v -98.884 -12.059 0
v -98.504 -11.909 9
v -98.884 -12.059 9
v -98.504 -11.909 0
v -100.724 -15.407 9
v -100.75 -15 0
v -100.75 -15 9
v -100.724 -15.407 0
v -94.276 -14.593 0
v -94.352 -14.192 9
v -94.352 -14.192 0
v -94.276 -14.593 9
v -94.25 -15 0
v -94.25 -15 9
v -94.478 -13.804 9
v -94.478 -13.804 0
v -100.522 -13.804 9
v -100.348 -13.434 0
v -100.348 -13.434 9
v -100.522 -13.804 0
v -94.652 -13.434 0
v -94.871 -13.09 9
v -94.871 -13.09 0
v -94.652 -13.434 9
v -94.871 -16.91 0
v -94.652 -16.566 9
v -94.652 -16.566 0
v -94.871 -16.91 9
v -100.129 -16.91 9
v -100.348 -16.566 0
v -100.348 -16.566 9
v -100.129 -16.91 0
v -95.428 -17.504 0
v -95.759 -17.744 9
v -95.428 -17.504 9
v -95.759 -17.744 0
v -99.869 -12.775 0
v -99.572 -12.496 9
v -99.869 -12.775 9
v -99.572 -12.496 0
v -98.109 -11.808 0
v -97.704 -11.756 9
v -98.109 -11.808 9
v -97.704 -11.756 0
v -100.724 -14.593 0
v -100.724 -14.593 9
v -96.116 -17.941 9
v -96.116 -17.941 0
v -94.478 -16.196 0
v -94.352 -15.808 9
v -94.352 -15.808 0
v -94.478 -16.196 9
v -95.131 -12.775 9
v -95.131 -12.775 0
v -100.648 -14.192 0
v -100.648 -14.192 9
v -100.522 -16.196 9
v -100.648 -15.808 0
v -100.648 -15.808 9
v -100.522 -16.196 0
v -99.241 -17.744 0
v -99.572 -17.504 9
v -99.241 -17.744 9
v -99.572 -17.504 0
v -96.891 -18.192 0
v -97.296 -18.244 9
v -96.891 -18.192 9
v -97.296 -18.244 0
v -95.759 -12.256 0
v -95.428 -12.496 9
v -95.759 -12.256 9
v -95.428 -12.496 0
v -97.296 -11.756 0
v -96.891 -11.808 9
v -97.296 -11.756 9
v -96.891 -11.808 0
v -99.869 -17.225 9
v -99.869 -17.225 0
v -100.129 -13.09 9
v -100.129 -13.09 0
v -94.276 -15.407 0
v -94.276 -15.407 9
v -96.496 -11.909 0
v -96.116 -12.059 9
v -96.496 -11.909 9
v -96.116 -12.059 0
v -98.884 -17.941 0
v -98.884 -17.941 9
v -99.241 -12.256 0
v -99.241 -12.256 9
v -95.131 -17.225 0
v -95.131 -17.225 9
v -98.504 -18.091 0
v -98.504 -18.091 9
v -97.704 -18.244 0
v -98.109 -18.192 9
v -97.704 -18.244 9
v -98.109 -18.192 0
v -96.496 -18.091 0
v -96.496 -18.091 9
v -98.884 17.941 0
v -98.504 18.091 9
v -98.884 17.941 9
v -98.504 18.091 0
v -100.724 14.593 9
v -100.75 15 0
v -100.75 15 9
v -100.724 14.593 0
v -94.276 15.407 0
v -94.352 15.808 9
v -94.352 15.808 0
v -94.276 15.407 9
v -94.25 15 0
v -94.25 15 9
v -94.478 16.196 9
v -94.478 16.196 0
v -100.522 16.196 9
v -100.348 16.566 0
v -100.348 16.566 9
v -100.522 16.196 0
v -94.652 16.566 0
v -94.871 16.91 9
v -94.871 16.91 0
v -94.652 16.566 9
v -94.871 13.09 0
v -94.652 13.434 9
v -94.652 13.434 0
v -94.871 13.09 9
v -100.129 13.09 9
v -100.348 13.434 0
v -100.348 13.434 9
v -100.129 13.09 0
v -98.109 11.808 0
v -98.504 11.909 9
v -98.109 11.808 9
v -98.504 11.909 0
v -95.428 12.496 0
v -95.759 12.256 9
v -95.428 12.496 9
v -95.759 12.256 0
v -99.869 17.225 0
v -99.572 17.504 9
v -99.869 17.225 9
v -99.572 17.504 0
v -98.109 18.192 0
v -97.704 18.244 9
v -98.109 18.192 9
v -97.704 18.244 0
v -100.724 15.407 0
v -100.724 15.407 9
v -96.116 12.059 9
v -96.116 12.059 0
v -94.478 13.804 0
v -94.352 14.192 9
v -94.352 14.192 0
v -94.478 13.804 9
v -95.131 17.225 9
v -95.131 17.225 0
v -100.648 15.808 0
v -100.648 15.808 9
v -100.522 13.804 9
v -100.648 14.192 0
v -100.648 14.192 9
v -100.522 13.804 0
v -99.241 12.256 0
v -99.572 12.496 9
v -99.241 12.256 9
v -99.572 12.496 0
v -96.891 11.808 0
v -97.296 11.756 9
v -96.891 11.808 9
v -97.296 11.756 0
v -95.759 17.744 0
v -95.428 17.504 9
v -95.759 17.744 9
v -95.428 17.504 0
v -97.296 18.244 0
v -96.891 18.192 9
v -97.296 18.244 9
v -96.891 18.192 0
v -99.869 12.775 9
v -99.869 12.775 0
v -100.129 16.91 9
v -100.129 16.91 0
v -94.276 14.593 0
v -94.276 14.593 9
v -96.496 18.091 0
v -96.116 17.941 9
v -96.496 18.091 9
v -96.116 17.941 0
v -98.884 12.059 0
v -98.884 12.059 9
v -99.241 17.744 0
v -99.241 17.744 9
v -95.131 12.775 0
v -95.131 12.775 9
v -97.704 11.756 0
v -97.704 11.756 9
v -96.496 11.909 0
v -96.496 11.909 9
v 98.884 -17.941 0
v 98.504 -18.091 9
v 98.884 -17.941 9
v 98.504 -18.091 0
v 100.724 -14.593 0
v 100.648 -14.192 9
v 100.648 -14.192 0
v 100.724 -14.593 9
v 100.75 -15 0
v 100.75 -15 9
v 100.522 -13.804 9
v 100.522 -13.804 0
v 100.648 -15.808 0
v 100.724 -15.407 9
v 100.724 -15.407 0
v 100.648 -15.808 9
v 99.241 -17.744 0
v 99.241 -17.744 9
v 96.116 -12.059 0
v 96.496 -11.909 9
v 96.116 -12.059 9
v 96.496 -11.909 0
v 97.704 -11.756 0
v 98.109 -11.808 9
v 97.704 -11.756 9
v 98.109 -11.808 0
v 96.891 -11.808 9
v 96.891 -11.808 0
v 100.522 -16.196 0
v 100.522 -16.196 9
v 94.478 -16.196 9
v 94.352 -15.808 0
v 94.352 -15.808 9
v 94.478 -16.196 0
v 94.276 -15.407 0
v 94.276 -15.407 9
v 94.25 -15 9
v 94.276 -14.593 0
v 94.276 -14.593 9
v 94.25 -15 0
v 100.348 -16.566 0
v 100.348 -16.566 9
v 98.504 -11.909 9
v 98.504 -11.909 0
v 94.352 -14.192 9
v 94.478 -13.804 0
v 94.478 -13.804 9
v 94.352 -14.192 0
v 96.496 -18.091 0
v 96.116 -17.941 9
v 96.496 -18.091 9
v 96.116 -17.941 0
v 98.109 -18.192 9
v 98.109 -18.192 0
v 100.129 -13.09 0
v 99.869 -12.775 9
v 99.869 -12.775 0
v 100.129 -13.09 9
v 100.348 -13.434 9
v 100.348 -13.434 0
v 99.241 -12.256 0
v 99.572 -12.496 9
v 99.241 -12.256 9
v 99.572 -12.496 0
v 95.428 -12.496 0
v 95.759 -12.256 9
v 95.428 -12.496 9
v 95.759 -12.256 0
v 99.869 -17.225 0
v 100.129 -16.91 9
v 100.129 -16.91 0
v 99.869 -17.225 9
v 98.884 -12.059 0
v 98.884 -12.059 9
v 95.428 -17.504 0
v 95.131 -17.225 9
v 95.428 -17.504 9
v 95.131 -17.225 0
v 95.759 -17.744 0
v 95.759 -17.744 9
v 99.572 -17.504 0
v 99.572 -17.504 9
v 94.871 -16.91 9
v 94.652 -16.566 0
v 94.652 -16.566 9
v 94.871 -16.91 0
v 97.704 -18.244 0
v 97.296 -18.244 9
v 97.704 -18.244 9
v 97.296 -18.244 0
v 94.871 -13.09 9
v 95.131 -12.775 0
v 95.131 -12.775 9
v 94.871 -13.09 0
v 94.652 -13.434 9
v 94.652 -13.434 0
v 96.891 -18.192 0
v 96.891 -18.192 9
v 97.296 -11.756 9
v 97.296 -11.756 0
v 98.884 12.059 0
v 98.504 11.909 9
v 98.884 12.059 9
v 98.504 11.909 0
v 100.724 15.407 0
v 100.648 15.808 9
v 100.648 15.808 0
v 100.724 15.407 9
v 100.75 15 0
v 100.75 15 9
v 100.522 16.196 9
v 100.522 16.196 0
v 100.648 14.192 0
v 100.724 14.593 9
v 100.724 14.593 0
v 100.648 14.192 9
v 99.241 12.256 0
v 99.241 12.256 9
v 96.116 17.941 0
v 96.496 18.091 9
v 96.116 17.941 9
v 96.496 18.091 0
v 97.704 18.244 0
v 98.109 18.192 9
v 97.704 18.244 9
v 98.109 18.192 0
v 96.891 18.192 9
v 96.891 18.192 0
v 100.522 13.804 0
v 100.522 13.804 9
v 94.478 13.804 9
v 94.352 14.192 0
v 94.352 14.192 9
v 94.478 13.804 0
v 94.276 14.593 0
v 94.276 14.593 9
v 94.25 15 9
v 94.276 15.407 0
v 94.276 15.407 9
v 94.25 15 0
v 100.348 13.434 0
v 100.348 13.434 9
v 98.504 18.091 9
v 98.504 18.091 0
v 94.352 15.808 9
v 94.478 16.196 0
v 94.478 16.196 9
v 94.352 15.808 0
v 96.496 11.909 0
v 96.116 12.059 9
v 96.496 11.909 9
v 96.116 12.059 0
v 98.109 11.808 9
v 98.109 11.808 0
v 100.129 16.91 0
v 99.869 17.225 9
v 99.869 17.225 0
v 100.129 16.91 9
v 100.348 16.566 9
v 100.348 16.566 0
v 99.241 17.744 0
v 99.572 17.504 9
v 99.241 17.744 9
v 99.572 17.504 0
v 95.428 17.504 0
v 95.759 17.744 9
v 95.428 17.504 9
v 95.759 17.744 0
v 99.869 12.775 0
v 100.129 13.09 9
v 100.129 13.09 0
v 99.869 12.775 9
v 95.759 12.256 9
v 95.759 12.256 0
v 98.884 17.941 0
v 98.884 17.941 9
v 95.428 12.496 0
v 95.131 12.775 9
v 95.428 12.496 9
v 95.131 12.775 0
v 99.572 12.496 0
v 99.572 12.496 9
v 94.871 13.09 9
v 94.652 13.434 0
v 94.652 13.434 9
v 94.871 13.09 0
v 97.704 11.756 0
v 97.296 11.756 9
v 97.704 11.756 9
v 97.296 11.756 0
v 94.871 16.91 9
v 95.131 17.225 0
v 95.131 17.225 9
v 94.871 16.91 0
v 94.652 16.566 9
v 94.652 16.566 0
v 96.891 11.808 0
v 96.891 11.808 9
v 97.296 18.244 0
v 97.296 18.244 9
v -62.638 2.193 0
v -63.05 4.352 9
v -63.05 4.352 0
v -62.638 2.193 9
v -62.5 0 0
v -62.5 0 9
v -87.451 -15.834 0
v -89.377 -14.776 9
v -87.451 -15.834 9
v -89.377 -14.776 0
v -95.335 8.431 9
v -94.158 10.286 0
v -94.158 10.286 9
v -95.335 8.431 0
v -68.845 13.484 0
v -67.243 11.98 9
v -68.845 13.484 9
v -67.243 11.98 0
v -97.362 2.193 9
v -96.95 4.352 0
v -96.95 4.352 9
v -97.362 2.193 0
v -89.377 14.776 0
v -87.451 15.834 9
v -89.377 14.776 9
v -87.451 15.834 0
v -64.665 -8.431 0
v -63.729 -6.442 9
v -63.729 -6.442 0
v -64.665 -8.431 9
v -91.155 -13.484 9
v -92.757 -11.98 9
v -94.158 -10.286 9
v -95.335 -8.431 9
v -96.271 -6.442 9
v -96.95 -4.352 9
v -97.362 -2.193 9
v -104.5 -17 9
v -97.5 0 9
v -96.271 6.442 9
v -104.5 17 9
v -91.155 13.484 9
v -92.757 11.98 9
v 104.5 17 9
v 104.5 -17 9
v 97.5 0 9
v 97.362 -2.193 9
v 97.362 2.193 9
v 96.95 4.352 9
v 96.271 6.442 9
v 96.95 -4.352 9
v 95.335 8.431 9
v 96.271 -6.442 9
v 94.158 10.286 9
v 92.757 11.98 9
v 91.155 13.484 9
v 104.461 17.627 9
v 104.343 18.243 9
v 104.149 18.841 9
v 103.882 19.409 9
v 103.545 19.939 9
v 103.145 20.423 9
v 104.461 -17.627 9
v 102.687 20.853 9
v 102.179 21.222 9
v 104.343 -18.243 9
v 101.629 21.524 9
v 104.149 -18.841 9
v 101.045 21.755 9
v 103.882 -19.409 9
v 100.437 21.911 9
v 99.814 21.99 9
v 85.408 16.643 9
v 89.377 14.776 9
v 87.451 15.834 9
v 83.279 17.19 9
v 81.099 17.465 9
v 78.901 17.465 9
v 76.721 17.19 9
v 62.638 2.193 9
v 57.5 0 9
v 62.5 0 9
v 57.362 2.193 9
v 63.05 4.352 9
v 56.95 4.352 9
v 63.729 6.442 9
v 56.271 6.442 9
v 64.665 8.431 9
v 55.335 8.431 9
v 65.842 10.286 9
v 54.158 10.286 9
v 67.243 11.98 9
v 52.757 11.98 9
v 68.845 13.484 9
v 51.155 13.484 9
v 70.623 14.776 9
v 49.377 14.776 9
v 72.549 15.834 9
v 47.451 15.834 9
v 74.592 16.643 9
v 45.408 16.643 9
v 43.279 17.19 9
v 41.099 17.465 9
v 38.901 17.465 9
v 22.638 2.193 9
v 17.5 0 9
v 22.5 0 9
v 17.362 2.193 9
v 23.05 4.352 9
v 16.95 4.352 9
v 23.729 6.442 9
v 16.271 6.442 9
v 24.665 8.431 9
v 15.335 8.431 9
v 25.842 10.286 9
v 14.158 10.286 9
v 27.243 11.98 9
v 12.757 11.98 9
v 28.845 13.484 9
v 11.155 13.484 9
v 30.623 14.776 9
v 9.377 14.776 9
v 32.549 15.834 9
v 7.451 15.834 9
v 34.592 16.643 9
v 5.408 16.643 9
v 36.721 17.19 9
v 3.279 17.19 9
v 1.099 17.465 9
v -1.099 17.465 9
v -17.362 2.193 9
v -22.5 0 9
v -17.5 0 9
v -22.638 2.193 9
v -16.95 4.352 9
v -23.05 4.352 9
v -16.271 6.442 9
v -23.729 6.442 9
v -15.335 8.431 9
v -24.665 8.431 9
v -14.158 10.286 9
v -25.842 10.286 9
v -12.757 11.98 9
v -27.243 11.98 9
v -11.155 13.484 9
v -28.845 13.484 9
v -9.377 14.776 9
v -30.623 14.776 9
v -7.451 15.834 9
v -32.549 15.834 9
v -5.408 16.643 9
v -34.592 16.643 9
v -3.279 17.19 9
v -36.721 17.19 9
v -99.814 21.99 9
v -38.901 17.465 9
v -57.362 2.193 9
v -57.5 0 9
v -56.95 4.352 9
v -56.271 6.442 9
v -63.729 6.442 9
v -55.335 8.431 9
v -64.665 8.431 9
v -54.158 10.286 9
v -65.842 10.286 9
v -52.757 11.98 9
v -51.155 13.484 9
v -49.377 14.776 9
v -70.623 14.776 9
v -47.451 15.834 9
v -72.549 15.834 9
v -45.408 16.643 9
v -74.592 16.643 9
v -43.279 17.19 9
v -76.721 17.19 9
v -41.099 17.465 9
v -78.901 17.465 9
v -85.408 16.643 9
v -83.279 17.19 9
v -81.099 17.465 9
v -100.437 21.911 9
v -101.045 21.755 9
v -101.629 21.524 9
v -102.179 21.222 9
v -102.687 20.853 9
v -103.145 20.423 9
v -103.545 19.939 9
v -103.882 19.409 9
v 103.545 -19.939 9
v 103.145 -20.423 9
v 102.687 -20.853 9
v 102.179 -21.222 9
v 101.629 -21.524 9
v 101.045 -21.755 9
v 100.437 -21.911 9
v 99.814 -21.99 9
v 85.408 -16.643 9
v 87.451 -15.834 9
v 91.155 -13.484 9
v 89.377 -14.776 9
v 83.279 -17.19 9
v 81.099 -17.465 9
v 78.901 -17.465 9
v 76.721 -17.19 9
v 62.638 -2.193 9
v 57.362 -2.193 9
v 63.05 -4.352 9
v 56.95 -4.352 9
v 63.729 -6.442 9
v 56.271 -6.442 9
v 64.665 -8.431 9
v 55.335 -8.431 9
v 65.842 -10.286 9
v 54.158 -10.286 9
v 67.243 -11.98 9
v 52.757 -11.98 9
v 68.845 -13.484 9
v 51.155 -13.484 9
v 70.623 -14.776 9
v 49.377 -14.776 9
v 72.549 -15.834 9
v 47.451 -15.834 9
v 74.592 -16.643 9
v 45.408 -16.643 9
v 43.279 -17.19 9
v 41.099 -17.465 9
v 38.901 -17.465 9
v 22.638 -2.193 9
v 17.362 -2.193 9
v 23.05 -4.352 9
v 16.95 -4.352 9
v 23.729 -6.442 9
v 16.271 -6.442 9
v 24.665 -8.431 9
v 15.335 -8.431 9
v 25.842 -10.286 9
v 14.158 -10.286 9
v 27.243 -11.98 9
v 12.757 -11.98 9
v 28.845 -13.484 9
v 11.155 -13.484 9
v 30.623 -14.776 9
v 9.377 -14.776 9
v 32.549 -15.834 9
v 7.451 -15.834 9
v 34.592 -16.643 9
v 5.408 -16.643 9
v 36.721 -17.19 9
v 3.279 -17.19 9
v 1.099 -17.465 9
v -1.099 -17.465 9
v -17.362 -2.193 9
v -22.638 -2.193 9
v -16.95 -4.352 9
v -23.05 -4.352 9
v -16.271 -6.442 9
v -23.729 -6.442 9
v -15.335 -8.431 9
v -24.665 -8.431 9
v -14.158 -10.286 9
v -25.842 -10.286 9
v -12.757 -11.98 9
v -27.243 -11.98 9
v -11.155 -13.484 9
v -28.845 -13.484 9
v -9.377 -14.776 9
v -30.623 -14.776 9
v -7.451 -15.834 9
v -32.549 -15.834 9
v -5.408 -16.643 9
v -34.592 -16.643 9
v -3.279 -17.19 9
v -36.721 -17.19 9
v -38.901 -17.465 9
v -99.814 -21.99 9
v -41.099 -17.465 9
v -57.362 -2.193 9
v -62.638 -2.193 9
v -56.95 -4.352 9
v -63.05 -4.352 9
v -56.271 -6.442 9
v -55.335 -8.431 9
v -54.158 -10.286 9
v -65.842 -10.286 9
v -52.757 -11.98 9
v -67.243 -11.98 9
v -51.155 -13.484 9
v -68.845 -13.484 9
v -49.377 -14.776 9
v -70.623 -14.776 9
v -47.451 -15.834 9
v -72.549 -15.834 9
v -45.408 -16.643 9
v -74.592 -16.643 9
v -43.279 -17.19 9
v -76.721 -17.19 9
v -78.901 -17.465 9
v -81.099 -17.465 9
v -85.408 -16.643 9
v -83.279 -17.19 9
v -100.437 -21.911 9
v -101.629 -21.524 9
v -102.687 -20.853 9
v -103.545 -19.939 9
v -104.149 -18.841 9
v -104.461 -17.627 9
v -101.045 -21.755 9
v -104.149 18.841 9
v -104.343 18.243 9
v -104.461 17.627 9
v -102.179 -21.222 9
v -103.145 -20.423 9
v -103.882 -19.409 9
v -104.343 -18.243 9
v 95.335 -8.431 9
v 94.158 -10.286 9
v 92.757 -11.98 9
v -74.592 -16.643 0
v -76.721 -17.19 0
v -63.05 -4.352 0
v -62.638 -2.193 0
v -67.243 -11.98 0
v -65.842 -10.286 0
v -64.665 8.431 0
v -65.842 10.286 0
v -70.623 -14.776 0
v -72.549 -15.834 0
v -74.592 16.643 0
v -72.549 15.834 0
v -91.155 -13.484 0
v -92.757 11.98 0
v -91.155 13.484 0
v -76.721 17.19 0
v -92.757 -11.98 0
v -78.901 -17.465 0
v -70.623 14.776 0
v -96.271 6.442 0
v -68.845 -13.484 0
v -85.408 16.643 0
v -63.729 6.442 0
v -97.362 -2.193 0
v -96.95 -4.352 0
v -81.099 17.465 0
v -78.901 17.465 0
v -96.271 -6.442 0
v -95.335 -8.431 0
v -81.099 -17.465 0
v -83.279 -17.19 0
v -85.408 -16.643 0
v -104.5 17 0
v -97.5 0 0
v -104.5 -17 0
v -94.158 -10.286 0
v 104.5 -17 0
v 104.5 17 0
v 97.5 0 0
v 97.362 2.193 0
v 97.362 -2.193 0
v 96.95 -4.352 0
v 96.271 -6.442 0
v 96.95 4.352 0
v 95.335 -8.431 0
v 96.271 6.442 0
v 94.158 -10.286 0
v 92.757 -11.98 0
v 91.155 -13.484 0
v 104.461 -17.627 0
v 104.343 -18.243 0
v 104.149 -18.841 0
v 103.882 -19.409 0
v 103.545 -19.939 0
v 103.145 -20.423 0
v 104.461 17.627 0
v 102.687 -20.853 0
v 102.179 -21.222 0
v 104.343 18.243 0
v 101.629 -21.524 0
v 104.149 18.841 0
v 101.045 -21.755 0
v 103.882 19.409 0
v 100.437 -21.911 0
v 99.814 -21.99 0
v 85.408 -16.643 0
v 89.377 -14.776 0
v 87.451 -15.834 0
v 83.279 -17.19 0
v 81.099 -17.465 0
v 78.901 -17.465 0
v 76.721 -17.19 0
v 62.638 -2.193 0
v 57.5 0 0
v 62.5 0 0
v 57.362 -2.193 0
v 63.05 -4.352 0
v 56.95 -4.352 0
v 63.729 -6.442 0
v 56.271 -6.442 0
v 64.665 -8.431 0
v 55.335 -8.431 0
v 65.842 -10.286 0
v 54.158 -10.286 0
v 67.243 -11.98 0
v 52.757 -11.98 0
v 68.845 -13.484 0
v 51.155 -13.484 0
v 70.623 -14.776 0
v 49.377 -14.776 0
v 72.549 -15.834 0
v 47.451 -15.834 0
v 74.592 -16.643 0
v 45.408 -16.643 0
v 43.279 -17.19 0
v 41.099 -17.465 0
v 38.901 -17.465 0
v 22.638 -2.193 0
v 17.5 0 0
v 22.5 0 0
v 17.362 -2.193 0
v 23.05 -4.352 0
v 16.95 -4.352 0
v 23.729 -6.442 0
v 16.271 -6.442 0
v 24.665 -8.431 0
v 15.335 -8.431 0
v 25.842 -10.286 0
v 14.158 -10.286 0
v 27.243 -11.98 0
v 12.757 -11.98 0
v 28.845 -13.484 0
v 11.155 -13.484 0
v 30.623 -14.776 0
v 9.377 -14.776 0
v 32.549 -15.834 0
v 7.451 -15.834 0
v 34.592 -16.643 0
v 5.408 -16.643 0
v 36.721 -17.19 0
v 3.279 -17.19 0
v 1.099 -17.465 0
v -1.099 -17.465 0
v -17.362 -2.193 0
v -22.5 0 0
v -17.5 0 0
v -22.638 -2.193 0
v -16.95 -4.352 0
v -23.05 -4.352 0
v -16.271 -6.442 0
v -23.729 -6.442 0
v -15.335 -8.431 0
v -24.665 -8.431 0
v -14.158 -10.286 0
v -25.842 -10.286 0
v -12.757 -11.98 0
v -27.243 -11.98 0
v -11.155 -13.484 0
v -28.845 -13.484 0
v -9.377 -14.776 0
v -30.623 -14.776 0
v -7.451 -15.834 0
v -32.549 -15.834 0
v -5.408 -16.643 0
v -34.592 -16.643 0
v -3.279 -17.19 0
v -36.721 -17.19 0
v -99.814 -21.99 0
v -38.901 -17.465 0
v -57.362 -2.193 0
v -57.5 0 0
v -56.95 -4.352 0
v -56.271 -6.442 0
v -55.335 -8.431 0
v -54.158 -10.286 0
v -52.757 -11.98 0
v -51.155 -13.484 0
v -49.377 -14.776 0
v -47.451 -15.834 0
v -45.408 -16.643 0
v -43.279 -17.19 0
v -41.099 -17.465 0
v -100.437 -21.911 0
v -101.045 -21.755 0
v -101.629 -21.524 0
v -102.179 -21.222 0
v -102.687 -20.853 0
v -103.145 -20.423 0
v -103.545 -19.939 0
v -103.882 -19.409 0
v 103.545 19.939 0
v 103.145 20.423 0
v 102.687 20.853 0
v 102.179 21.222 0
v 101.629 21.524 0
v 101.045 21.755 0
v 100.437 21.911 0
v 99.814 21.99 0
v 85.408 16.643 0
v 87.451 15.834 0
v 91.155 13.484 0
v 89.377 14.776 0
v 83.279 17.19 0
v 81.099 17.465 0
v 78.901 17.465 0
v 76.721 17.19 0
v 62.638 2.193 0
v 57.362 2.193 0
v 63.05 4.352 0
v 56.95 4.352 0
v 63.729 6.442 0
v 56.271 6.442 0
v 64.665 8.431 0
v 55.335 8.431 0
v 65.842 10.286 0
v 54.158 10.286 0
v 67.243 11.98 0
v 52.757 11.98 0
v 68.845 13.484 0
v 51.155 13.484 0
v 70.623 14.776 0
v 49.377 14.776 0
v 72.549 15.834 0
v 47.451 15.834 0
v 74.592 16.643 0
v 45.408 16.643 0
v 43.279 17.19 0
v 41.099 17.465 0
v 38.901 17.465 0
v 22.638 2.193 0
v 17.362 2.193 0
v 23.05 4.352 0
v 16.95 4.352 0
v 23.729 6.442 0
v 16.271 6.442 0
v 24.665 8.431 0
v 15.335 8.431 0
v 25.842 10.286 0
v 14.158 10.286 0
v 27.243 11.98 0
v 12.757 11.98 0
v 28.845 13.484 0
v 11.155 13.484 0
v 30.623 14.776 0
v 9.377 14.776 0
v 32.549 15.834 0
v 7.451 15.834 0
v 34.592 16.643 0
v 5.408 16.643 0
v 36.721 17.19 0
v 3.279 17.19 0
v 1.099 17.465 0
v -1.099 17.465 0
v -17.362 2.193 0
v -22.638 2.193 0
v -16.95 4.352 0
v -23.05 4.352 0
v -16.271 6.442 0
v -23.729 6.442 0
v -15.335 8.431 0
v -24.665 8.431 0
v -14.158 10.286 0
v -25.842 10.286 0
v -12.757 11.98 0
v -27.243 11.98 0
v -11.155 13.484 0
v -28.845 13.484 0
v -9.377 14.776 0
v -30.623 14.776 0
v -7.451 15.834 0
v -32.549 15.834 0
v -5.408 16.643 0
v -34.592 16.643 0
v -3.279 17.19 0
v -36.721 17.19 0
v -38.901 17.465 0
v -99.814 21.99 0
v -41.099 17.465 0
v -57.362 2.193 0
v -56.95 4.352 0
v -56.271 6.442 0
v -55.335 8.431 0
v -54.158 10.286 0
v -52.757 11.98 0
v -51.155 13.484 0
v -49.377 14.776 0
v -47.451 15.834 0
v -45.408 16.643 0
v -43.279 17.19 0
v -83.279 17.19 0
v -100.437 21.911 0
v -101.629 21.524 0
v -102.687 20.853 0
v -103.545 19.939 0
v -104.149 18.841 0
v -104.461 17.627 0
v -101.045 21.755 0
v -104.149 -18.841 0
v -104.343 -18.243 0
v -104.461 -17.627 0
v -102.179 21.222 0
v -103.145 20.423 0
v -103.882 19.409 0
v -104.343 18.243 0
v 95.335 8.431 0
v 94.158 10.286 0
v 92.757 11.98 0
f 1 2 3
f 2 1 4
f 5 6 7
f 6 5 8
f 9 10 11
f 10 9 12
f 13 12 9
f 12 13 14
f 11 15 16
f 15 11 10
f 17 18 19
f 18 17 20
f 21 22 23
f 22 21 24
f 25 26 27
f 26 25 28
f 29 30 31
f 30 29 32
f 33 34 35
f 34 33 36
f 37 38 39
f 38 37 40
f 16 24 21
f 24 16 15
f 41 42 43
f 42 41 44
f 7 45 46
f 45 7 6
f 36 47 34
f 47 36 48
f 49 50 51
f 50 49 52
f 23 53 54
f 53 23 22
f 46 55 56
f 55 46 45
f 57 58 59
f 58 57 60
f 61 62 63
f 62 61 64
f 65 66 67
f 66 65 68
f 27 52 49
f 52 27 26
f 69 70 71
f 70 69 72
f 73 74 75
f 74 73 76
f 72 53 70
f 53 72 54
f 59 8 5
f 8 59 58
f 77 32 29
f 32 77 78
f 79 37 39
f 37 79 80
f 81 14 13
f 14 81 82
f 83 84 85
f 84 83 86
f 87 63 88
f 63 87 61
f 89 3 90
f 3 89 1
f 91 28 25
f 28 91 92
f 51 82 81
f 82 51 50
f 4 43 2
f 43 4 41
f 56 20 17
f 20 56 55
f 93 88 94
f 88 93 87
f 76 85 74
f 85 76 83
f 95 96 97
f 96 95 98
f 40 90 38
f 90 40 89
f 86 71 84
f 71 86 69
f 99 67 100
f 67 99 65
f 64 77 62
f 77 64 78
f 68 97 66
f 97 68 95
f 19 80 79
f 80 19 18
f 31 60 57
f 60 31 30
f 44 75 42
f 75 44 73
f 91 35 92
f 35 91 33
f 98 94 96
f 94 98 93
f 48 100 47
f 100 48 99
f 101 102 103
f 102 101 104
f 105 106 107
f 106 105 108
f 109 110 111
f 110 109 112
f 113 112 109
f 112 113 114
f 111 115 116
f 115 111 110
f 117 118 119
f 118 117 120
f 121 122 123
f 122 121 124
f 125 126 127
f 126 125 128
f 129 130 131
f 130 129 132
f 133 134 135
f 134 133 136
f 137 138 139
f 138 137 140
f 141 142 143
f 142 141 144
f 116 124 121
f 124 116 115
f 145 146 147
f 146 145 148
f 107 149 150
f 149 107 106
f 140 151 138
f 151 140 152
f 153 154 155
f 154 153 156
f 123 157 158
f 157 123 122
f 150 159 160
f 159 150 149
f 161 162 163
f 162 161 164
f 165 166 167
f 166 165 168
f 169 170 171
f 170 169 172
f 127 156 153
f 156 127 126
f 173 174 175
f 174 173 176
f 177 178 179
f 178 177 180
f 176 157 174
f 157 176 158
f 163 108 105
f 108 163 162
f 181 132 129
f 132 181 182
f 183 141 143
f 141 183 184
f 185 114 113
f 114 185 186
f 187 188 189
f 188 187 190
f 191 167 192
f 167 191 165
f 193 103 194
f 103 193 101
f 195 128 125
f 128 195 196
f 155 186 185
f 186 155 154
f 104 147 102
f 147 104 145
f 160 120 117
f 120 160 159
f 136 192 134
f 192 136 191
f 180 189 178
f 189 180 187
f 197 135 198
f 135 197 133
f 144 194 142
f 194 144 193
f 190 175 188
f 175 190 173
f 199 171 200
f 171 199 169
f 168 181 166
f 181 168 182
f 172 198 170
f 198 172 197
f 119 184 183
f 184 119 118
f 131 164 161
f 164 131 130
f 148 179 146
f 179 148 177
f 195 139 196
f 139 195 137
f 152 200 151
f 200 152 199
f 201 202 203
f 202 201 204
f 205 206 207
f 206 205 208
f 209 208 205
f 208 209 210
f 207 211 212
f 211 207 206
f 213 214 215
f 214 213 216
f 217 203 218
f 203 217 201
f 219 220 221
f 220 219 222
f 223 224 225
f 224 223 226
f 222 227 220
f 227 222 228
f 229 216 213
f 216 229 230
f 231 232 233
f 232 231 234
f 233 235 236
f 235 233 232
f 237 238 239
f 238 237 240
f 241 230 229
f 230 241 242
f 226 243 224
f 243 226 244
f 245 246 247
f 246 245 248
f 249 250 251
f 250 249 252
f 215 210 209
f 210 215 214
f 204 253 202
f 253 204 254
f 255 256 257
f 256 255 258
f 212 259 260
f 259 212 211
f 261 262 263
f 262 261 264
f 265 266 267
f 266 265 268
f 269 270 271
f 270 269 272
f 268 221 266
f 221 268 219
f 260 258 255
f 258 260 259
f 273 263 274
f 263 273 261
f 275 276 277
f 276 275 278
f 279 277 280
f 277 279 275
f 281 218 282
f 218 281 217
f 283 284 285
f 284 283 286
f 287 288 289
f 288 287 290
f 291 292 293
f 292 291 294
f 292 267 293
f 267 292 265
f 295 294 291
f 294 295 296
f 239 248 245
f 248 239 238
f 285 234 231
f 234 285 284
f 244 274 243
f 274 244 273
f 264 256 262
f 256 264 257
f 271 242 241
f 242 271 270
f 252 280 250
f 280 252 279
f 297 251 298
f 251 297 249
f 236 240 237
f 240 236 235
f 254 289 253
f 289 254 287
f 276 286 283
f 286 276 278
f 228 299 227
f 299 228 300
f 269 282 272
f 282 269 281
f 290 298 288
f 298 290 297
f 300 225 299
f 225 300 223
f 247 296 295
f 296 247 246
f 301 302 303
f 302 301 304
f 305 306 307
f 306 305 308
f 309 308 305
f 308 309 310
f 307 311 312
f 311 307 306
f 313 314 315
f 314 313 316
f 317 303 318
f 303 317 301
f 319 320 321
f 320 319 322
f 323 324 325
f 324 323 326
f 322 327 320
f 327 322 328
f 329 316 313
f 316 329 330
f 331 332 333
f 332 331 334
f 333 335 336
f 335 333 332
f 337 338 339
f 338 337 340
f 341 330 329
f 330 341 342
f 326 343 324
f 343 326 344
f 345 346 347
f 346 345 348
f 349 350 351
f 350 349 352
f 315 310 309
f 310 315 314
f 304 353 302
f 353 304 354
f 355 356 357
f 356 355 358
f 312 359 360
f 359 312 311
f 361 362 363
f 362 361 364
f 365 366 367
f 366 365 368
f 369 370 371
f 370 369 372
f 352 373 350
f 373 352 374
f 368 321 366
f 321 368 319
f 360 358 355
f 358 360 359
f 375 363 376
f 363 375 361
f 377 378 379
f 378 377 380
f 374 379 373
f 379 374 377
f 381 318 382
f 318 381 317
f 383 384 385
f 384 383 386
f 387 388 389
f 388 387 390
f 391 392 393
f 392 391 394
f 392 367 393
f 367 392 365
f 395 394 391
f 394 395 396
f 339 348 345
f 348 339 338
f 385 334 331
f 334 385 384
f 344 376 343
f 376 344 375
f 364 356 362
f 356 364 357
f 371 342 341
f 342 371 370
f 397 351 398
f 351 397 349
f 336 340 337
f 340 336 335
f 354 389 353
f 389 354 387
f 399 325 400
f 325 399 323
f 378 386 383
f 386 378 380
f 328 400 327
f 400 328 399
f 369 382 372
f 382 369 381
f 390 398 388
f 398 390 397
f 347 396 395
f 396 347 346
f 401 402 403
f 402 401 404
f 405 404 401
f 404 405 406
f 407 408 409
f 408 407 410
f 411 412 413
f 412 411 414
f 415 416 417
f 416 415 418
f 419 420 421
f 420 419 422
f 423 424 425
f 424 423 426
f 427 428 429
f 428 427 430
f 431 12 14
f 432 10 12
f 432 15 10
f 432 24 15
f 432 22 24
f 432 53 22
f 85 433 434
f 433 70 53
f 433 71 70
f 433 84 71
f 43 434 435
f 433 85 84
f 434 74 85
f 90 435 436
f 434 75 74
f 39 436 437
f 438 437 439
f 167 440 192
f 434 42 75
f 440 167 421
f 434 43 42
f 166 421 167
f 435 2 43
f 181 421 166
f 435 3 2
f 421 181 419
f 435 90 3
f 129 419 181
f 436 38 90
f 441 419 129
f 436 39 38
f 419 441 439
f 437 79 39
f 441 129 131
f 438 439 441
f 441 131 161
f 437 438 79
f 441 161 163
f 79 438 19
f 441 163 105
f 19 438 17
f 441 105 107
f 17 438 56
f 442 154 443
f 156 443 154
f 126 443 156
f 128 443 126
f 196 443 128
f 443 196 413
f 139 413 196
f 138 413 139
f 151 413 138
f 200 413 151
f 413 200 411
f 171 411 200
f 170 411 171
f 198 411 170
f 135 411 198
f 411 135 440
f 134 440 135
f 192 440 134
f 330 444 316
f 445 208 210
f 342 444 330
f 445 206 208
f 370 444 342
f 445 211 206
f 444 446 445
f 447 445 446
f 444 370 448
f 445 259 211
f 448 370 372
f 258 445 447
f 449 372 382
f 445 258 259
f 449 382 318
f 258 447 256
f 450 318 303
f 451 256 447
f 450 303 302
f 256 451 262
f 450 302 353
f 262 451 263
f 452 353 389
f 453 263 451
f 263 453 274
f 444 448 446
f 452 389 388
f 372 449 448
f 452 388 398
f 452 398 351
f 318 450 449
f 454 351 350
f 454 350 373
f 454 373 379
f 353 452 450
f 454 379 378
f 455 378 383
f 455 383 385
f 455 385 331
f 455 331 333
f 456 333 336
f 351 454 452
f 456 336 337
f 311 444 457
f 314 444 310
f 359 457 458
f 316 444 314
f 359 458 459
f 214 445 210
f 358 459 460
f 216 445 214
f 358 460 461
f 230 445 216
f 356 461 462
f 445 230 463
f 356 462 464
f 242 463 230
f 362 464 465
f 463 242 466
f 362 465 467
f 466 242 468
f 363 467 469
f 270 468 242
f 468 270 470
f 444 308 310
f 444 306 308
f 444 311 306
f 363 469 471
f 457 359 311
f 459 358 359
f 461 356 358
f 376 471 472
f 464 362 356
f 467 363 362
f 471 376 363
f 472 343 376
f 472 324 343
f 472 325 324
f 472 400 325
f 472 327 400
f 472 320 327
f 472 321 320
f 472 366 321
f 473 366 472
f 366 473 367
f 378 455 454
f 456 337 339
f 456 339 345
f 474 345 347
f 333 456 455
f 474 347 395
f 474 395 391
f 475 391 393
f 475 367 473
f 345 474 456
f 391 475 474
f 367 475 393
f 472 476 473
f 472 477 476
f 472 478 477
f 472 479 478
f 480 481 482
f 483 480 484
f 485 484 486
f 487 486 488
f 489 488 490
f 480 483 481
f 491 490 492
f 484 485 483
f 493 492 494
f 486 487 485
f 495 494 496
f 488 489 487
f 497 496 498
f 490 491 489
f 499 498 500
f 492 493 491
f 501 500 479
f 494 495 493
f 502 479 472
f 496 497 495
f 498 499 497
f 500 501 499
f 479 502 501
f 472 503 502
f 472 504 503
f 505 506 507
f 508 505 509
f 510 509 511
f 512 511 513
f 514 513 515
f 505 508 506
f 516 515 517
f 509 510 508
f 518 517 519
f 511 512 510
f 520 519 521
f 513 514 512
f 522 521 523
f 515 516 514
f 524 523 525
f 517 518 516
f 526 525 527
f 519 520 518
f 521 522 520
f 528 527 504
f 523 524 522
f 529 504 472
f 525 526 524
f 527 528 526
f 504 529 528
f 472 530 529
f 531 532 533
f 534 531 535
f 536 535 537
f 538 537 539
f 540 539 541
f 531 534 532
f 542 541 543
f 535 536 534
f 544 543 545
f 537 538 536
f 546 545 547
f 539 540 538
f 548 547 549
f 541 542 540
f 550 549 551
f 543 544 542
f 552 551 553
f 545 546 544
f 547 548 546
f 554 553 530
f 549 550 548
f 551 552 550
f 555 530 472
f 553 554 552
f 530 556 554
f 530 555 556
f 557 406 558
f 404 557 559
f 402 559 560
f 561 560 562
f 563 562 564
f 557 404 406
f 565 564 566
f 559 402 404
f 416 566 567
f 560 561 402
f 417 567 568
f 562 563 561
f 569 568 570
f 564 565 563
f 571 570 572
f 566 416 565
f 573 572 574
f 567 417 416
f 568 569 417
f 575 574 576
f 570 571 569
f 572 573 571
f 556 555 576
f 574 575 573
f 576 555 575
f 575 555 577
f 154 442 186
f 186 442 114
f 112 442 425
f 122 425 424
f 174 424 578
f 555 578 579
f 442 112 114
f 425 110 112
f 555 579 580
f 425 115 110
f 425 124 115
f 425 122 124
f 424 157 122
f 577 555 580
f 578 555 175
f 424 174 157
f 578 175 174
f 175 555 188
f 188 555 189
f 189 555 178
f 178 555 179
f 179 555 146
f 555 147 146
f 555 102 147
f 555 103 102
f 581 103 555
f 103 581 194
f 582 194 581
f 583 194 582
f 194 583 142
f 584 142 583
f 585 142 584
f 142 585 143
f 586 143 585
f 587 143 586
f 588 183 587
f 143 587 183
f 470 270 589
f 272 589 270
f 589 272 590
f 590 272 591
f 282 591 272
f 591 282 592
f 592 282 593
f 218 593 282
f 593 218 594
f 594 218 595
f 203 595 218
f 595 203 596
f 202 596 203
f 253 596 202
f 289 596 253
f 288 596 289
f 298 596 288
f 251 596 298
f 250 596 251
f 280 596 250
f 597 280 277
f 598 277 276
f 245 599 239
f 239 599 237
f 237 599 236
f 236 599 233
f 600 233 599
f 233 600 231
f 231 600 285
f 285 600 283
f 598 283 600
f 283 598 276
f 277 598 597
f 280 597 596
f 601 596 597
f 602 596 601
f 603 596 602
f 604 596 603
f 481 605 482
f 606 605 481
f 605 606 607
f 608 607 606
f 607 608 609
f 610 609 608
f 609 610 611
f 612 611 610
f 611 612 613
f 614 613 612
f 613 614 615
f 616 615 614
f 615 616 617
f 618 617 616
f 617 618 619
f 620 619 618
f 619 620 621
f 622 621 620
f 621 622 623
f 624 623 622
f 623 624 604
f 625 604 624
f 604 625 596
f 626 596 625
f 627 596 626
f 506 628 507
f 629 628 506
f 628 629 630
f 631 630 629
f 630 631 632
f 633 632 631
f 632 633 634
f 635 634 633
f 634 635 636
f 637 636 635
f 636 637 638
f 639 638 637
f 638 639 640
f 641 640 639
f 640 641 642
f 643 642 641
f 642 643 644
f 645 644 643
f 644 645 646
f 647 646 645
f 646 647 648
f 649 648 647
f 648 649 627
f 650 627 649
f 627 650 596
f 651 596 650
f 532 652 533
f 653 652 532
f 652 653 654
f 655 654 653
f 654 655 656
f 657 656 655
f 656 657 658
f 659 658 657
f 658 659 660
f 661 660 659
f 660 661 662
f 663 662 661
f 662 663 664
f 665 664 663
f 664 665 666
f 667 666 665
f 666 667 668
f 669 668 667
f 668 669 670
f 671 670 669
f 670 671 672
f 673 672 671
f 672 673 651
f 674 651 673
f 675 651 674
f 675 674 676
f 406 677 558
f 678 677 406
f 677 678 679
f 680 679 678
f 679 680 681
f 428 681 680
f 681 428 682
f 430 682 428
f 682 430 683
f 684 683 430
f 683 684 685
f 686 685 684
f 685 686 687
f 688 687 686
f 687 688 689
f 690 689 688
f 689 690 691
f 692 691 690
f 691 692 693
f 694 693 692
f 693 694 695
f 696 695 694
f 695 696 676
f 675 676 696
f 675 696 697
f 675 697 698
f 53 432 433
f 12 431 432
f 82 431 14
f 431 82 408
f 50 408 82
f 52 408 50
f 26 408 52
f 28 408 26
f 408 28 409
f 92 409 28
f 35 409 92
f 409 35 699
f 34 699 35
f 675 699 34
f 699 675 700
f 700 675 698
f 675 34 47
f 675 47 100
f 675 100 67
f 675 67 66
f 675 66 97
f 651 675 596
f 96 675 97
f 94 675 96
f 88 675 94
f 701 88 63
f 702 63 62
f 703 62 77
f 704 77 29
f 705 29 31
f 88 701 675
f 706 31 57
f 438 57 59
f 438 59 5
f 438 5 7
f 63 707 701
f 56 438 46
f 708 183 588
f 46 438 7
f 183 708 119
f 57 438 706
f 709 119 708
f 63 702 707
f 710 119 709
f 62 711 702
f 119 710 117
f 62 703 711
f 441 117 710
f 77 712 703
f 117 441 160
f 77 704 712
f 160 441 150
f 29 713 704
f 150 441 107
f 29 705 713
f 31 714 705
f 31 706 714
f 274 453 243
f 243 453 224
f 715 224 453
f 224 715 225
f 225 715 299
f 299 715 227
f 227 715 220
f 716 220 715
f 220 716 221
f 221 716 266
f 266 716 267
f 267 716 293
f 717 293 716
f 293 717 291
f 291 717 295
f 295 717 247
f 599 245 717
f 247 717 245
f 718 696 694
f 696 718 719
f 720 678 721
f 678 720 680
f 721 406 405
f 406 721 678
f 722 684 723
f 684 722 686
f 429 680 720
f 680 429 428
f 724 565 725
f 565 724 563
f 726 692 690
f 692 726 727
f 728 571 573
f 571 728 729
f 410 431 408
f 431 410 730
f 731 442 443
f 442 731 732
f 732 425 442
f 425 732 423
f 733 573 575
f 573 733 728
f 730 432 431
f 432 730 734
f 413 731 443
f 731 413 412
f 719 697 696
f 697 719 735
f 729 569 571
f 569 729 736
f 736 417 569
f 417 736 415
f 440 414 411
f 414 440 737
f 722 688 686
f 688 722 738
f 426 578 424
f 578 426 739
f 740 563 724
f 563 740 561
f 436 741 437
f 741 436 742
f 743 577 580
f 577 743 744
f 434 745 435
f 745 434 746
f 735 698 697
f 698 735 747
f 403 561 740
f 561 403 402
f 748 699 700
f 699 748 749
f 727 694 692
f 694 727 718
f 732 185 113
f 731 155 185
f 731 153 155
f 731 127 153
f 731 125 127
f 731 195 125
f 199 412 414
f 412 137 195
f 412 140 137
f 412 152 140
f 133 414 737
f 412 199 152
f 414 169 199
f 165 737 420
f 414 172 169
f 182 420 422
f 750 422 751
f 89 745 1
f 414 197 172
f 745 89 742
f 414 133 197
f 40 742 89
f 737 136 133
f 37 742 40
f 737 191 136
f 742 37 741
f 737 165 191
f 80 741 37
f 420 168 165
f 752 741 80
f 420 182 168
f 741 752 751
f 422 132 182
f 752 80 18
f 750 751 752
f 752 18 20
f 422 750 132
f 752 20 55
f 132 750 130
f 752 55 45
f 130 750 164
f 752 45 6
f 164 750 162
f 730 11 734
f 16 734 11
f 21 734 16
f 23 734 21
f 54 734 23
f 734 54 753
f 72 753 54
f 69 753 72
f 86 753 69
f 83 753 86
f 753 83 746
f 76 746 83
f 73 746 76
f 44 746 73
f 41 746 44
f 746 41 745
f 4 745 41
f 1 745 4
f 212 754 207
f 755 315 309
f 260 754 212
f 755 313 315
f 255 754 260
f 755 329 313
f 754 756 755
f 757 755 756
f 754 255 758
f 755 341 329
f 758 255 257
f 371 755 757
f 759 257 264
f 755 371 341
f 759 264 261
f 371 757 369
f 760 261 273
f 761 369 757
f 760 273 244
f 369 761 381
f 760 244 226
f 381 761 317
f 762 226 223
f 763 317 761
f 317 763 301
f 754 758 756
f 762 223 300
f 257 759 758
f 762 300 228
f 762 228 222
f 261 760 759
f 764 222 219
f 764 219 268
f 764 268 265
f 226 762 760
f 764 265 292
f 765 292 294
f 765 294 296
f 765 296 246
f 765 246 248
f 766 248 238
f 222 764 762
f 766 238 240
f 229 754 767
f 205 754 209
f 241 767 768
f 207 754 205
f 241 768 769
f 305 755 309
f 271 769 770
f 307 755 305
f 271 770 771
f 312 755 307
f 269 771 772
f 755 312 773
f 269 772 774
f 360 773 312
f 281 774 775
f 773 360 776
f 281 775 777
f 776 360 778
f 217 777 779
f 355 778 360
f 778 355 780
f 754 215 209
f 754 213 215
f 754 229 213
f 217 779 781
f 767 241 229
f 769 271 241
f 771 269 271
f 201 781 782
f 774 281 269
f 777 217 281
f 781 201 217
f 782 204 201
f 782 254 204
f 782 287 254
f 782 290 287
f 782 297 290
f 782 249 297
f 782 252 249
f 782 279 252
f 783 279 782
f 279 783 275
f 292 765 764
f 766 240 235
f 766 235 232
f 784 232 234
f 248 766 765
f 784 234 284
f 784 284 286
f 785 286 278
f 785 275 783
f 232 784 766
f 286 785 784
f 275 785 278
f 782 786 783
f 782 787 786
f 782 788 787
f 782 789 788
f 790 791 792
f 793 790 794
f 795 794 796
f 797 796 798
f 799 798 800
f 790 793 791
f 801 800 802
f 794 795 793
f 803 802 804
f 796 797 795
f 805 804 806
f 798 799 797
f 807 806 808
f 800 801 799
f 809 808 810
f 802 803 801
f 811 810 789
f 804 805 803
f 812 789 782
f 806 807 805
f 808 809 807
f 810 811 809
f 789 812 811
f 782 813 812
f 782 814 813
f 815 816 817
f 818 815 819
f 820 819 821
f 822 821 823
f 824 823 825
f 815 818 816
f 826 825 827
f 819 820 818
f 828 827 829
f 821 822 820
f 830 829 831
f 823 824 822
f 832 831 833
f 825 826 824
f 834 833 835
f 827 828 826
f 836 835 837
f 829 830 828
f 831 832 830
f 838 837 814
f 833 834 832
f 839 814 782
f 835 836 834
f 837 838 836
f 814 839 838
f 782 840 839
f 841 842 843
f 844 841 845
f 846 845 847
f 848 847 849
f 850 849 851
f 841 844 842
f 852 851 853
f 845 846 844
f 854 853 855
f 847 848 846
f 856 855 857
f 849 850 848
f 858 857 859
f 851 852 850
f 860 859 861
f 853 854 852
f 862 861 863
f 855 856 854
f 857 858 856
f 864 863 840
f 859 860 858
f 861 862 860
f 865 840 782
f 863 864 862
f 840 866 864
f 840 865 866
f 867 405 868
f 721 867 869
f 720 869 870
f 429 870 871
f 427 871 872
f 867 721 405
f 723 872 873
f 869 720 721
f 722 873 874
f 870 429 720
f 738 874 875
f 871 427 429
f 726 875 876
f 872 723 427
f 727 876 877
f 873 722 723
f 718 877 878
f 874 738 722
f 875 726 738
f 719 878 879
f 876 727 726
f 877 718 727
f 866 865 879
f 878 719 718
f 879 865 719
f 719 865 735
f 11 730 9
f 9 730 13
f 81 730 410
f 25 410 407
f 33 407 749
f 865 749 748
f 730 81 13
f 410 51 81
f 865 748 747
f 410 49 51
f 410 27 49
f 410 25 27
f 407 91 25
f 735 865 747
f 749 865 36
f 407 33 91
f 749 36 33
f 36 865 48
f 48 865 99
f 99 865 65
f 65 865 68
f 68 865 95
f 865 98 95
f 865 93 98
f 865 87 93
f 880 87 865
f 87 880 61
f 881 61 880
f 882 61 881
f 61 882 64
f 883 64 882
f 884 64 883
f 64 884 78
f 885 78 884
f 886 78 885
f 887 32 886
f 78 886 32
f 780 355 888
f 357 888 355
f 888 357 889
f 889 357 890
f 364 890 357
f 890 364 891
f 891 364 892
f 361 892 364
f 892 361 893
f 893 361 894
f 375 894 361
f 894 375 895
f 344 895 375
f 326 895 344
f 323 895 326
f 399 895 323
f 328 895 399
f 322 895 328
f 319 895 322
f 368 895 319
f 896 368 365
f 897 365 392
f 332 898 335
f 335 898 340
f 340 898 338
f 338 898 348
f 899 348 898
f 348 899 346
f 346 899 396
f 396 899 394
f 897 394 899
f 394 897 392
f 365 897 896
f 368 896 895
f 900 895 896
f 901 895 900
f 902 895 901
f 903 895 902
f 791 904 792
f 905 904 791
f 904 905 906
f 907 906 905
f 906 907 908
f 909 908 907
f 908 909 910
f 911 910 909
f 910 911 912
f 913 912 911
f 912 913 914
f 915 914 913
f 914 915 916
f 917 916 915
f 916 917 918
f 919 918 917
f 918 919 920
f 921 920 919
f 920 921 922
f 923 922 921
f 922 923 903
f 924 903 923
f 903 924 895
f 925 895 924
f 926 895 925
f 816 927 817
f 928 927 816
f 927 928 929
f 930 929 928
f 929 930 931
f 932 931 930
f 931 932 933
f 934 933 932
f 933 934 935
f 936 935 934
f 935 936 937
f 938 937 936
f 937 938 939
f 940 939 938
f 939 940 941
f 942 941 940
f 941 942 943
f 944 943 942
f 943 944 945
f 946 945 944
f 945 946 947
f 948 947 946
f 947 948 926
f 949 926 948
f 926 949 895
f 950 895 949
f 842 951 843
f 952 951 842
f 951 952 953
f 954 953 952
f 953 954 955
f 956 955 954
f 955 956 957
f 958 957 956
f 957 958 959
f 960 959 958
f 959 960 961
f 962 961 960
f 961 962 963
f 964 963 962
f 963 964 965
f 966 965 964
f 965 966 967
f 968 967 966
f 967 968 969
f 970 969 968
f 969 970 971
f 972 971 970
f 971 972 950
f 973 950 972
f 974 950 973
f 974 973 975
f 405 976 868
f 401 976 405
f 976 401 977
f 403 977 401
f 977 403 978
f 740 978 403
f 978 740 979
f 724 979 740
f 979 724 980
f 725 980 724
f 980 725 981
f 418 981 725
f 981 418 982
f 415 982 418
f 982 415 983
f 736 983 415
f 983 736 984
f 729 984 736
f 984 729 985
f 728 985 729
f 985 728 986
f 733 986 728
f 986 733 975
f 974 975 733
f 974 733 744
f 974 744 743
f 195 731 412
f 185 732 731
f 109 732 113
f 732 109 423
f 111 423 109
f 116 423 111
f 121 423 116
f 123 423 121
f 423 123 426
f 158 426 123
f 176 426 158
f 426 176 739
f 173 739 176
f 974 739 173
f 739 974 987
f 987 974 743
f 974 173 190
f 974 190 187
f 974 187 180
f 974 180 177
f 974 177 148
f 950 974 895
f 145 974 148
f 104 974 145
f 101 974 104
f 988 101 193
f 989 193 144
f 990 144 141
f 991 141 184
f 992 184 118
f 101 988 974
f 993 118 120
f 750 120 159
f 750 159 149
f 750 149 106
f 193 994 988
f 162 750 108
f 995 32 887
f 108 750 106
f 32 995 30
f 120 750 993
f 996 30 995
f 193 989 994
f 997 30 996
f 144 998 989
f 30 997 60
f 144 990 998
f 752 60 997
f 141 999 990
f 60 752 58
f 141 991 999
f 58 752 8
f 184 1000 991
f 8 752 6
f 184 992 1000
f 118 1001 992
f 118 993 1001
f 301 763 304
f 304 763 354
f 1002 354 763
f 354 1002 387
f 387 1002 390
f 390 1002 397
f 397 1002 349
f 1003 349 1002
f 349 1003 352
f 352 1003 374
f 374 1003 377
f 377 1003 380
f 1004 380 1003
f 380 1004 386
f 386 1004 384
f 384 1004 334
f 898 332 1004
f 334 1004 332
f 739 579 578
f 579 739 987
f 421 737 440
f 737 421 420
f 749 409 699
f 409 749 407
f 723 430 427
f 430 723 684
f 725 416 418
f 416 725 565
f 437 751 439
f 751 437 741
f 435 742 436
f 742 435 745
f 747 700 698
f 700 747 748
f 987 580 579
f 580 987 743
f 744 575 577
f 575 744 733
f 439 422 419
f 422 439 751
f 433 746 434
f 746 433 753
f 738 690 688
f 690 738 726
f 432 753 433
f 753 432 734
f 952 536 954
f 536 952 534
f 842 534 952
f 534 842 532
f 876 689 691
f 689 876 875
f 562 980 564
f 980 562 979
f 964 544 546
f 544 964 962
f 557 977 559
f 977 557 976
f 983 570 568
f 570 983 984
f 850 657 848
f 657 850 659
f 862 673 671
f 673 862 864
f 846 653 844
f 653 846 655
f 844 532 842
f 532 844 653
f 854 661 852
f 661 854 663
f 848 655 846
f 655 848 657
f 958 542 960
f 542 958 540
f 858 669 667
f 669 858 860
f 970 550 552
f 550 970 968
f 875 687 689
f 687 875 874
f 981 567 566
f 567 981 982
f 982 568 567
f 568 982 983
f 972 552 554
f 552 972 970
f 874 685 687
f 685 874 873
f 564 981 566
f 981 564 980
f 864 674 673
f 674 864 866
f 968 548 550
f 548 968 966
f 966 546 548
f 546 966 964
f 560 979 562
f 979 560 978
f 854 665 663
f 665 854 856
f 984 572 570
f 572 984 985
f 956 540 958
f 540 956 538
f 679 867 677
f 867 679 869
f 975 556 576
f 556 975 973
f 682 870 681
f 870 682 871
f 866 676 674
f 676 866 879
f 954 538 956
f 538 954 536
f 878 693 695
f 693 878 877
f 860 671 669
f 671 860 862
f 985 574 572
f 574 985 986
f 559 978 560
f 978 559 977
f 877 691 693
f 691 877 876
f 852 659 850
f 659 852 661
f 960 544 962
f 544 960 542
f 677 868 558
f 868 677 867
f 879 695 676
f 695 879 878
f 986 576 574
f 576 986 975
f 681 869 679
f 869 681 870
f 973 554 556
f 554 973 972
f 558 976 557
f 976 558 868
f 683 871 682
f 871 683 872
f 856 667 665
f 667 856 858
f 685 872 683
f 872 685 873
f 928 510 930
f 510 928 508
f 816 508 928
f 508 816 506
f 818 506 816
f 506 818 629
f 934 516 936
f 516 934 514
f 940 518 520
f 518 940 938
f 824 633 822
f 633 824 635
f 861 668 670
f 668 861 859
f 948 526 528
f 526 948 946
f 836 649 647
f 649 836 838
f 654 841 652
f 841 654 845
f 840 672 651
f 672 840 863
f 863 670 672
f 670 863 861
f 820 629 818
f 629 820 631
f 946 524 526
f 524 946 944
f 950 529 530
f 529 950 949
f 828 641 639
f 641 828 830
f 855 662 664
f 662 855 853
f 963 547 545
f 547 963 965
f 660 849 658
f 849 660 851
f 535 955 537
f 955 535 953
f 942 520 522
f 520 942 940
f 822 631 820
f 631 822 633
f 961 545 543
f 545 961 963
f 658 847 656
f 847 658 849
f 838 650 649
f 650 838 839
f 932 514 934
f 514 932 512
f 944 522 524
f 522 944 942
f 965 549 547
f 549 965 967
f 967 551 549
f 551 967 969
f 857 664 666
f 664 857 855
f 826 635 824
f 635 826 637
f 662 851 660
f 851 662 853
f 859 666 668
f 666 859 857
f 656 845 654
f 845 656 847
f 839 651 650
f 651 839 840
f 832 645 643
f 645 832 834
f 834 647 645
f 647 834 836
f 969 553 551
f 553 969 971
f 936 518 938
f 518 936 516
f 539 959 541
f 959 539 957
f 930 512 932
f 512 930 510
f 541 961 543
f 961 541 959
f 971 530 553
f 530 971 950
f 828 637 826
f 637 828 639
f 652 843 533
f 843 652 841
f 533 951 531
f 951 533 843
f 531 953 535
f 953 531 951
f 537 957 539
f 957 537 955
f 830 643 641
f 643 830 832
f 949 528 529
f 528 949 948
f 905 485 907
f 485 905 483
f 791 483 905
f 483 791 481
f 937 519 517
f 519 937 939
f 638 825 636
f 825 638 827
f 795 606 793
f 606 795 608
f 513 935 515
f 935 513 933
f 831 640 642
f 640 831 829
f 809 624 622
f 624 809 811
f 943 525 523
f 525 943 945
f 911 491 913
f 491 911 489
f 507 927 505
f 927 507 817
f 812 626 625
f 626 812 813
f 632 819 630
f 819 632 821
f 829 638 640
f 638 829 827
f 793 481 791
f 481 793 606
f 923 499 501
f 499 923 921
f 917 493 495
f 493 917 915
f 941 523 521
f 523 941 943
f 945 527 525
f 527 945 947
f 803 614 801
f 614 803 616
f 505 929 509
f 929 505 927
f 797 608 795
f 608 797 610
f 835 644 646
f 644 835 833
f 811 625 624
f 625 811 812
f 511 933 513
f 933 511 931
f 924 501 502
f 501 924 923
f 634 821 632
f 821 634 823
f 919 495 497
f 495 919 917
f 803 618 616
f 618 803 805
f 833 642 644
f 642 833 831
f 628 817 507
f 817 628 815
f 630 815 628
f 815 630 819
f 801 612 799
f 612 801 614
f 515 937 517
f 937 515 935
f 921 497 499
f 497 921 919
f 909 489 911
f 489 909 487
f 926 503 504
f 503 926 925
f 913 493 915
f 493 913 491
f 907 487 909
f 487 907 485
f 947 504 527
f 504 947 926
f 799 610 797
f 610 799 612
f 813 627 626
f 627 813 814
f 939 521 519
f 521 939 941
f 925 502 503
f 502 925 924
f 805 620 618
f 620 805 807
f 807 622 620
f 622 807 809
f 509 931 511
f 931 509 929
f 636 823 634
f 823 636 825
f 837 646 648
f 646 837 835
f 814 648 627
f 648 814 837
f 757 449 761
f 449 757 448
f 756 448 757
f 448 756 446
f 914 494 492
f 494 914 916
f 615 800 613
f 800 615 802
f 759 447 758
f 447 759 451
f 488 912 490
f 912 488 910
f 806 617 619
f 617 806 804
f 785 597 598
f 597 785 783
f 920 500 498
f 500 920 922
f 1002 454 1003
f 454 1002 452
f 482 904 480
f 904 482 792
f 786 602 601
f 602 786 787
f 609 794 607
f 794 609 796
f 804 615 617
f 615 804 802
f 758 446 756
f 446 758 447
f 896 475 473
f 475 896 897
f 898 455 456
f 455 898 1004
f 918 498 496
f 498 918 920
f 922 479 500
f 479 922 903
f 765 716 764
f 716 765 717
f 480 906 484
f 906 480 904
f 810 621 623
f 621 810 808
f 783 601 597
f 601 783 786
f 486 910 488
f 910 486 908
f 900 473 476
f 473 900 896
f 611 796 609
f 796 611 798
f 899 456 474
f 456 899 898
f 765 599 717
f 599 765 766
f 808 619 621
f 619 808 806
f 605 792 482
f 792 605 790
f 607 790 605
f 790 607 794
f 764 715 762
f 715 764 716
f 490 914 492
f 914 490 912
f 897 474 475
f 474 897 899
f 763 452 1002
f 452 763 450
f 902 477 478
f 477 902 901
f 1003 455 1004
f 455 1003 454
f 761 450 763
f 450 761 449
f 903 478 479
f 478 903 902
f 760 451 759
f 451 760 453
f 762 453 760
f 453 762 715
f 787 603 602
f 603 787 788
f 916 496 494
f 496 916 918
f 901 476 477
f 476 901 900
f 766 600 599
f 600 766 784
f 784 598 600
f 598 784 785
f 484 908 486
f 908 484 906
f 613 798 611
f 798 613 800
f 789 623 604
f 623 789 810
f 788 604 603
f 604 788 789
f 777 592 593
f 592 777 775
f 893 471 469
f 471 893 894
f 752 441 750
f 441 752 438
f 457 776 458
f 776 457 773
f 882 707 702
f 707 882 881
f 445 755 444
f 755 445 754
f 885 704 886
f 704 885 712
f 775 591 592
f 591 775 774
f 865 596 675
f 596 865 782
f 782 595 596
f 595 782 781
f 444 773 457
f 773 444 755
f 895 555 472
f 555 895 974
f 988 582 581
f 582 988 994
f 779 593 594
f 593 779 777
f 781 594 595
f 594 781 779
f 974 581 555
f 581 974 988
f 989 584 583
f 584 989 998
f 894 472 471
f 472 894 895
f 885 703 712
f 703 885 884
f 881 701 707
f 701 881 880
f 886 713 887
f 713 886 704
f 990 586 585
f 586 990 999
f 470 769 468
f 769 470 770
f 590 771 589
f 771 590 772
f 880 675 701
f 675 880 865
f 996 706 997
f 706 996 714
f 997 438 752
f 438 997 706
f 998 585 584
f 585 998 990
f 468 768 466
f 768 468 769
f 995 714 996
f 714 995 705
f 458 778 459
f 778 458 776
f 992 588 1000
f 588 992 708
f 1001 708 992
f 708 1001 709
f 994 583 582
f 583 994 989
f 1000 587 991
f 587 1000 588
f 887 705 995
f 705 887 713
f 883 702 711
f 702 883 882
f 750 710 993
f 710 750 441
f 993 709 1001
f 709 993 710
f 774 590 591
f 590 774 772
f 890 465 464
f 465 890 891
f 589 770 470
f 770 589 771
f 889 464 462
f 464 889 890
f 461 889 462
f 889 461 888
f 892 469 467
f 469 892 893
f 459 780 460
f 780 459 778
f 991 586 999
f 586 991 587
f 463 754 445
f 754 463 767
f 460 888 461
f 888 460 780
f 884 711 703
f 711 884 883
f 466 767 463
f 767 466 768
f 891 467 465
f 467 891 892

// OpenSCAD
$fn = 50;


difference() {
	union() {
		hull() {
			translate(v = [-99.5000000000, 17.0000000000, 0]) {
				cylinder(h = 9, r = 5);
			}
			translate(v = [99.5000000000, 17.0000000000, 0]) {
				cylinder(h = 9, r = 5);
			}
			translate(v = [-99.5000000000, -17.0000000000, 0]) {
				cylinder(h = 9, r = 5);
			}
			translate(v = [99.5000000000, -17.0000000000, 0]) {
				cylinder(h = 9, r = 5);
			}
		}
	}
	union() {
		#translate(v = [-97.5000000000, -15.0000000000, -100.0000000000]) {
			cylinder(h = 200, r = 3.2500000000);
		}
		#translate(v = [-97.5000000000, 15.0000000000, -100.0000000000]) {
			cylinder(h = 200, r = 3.2500000000);
		}
		#translate(v = [97.5000000000, -15.0000000000, -100.0000000000]) {
			cylinder(h = 200, r = 3.2500000000);
		}
		#translate(v = [97.5000000000, 15.0000000000, -100.0000000000]) {
			cylinder(h = 200, r = 3.2500000000);
		}
		#translate(v = [-80.0000000000, 0, 0]) {
			cylinder(h = 9, r = 17.5000000000);
		}
		#translate(v = [-40.0000000000, 0, 0]) {
			cylinder(h = 9, r = 17.5000000000);
		}
		#cylinder(h = 9, r = 17.5000000000);
		#translate(v = [40.0000000000, 0, 0]) {
			cylinder(h = 9, r = 17.5000000000);
		}
		#translate(v = [80.0000000000, 0, 0]) {
			cylinder(h = 9, r = 17.5000000000);
		}
	}
}
